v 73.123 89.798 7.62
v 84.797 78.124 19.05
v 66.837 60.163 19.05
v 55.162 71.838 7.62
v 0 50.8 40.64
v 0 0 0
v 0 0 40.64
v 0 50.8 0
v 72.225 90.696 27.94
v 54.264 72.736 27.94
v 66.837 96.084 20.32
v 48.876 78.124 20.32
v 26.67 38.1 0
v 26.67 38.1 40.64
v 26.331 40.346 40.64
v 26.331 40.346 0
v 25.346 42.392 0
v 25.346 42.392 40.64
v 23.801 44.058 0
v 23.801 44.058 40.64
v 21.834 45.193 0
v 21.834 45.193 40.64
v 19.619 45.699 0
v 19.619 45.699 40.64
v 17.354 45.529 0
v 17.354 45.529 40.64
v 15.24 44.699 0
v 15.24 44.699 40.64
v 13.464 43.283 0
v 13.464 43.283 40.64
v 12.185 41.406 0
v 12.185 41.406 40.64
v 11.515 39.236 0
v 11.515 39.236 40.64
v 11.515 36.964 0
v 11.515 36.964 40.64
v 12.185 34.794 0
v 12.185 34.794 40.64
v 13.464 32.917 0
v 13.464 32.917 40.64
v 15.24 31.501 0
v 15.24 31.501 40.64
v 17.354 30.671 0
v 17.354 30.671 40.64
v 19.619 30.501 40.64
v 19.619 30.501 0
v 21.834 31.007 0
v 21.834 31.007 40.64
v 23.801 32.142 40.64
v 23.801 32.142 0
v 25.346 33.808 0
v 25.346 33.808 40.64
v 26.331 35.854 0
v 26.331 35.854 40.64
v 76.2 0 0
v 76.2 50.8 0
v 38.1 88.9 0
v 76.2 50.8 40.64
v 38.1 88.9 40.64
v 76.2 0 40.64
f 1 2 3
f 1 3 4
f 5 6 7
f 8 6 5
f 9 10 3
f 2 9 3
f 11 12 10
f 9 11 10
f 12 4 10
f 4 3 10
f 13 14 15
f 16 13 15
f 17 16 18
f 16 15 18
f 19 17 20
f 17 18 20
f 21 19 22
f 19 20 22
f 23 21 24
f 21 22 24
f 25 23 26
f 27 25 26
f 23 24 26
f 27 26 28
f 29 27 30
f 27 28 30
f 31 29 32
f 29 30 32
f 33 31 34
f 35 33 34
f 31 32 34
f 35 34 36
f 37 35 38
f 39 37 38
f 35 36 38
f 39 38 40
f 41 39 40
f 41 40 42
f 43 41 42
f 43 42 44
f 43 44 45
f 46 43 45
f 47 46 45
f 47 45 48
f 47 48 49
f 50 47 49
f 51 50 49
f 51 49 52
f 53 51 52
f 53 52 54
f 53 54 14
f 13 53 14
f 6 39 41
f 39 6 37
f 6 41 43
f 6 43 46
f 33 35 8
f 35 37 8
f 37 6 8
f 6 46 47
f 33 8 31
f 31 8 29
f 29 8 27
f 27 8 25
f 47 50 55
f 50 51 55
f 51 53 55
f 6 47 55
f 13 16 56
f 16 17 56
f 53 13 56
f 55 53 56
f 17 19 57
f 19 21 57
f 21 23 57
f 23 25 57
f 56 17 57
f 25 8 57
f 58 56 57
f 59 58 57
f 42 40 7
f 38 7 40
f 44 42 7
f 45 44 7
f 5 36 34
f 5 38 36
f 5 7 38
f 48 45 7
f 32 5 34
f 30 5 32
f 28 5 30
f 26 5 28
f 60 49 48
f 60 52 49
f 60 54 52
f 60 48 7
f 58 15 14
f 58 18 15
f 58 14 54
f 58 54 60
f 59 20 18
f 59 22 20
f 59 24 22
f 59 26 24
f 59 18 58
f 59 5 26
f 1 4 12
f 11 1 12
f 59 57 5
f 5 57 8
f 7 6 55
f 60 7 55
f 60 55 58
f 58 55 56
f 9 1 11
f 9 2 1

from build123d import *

# Parameters (mm, degrees)
F0_W     = 76.2
F0_H     = 50.8
F1_DEPTH = 40.64
F2_R     = 7.62
F3_DEPTH = 40.641
F5_DEPTH = 25.4


with BuildPart() as f1:
    # F0 (on Top) → F1 (new body)
    with BuildSketch(Plane.XY):
        with Locations((38.1, 25.4)):
            Rectangle(F0_W, F0_H)
        Polygon((38.1, 88.9), (0, 50.8), (76.2, 50.8), align=None)
    extrude(amount=F1_DEPTH)

    # F2 (on face) → F3 (cut, through all)
    with BuildSketch(Plane.XY.offset(40.64)):
        with Locations((19.05, 38.1)):
            Circle(F2_R)
    extrude(amount=-F3_DEPTH, mode=Mode.SUBTRACT)


with BuildPart() as f5:
    # F4 (on face) → F5 (new body)
    with BuildSketch(Plane(origin=(63.5, 63.5, 0), x_dir=(-0.707107, 0.707107, 0), z_dir=(0.707107, 0.707107, 0))):
        Polygon((11.791024, 7.62), (20.681024, 20.32), (13.061024, 27.94), (-4.718976, 19.05), align=None)
    extrude(amount=F5_DEPTH)


solid = Compound([f1.part, f5.part])
